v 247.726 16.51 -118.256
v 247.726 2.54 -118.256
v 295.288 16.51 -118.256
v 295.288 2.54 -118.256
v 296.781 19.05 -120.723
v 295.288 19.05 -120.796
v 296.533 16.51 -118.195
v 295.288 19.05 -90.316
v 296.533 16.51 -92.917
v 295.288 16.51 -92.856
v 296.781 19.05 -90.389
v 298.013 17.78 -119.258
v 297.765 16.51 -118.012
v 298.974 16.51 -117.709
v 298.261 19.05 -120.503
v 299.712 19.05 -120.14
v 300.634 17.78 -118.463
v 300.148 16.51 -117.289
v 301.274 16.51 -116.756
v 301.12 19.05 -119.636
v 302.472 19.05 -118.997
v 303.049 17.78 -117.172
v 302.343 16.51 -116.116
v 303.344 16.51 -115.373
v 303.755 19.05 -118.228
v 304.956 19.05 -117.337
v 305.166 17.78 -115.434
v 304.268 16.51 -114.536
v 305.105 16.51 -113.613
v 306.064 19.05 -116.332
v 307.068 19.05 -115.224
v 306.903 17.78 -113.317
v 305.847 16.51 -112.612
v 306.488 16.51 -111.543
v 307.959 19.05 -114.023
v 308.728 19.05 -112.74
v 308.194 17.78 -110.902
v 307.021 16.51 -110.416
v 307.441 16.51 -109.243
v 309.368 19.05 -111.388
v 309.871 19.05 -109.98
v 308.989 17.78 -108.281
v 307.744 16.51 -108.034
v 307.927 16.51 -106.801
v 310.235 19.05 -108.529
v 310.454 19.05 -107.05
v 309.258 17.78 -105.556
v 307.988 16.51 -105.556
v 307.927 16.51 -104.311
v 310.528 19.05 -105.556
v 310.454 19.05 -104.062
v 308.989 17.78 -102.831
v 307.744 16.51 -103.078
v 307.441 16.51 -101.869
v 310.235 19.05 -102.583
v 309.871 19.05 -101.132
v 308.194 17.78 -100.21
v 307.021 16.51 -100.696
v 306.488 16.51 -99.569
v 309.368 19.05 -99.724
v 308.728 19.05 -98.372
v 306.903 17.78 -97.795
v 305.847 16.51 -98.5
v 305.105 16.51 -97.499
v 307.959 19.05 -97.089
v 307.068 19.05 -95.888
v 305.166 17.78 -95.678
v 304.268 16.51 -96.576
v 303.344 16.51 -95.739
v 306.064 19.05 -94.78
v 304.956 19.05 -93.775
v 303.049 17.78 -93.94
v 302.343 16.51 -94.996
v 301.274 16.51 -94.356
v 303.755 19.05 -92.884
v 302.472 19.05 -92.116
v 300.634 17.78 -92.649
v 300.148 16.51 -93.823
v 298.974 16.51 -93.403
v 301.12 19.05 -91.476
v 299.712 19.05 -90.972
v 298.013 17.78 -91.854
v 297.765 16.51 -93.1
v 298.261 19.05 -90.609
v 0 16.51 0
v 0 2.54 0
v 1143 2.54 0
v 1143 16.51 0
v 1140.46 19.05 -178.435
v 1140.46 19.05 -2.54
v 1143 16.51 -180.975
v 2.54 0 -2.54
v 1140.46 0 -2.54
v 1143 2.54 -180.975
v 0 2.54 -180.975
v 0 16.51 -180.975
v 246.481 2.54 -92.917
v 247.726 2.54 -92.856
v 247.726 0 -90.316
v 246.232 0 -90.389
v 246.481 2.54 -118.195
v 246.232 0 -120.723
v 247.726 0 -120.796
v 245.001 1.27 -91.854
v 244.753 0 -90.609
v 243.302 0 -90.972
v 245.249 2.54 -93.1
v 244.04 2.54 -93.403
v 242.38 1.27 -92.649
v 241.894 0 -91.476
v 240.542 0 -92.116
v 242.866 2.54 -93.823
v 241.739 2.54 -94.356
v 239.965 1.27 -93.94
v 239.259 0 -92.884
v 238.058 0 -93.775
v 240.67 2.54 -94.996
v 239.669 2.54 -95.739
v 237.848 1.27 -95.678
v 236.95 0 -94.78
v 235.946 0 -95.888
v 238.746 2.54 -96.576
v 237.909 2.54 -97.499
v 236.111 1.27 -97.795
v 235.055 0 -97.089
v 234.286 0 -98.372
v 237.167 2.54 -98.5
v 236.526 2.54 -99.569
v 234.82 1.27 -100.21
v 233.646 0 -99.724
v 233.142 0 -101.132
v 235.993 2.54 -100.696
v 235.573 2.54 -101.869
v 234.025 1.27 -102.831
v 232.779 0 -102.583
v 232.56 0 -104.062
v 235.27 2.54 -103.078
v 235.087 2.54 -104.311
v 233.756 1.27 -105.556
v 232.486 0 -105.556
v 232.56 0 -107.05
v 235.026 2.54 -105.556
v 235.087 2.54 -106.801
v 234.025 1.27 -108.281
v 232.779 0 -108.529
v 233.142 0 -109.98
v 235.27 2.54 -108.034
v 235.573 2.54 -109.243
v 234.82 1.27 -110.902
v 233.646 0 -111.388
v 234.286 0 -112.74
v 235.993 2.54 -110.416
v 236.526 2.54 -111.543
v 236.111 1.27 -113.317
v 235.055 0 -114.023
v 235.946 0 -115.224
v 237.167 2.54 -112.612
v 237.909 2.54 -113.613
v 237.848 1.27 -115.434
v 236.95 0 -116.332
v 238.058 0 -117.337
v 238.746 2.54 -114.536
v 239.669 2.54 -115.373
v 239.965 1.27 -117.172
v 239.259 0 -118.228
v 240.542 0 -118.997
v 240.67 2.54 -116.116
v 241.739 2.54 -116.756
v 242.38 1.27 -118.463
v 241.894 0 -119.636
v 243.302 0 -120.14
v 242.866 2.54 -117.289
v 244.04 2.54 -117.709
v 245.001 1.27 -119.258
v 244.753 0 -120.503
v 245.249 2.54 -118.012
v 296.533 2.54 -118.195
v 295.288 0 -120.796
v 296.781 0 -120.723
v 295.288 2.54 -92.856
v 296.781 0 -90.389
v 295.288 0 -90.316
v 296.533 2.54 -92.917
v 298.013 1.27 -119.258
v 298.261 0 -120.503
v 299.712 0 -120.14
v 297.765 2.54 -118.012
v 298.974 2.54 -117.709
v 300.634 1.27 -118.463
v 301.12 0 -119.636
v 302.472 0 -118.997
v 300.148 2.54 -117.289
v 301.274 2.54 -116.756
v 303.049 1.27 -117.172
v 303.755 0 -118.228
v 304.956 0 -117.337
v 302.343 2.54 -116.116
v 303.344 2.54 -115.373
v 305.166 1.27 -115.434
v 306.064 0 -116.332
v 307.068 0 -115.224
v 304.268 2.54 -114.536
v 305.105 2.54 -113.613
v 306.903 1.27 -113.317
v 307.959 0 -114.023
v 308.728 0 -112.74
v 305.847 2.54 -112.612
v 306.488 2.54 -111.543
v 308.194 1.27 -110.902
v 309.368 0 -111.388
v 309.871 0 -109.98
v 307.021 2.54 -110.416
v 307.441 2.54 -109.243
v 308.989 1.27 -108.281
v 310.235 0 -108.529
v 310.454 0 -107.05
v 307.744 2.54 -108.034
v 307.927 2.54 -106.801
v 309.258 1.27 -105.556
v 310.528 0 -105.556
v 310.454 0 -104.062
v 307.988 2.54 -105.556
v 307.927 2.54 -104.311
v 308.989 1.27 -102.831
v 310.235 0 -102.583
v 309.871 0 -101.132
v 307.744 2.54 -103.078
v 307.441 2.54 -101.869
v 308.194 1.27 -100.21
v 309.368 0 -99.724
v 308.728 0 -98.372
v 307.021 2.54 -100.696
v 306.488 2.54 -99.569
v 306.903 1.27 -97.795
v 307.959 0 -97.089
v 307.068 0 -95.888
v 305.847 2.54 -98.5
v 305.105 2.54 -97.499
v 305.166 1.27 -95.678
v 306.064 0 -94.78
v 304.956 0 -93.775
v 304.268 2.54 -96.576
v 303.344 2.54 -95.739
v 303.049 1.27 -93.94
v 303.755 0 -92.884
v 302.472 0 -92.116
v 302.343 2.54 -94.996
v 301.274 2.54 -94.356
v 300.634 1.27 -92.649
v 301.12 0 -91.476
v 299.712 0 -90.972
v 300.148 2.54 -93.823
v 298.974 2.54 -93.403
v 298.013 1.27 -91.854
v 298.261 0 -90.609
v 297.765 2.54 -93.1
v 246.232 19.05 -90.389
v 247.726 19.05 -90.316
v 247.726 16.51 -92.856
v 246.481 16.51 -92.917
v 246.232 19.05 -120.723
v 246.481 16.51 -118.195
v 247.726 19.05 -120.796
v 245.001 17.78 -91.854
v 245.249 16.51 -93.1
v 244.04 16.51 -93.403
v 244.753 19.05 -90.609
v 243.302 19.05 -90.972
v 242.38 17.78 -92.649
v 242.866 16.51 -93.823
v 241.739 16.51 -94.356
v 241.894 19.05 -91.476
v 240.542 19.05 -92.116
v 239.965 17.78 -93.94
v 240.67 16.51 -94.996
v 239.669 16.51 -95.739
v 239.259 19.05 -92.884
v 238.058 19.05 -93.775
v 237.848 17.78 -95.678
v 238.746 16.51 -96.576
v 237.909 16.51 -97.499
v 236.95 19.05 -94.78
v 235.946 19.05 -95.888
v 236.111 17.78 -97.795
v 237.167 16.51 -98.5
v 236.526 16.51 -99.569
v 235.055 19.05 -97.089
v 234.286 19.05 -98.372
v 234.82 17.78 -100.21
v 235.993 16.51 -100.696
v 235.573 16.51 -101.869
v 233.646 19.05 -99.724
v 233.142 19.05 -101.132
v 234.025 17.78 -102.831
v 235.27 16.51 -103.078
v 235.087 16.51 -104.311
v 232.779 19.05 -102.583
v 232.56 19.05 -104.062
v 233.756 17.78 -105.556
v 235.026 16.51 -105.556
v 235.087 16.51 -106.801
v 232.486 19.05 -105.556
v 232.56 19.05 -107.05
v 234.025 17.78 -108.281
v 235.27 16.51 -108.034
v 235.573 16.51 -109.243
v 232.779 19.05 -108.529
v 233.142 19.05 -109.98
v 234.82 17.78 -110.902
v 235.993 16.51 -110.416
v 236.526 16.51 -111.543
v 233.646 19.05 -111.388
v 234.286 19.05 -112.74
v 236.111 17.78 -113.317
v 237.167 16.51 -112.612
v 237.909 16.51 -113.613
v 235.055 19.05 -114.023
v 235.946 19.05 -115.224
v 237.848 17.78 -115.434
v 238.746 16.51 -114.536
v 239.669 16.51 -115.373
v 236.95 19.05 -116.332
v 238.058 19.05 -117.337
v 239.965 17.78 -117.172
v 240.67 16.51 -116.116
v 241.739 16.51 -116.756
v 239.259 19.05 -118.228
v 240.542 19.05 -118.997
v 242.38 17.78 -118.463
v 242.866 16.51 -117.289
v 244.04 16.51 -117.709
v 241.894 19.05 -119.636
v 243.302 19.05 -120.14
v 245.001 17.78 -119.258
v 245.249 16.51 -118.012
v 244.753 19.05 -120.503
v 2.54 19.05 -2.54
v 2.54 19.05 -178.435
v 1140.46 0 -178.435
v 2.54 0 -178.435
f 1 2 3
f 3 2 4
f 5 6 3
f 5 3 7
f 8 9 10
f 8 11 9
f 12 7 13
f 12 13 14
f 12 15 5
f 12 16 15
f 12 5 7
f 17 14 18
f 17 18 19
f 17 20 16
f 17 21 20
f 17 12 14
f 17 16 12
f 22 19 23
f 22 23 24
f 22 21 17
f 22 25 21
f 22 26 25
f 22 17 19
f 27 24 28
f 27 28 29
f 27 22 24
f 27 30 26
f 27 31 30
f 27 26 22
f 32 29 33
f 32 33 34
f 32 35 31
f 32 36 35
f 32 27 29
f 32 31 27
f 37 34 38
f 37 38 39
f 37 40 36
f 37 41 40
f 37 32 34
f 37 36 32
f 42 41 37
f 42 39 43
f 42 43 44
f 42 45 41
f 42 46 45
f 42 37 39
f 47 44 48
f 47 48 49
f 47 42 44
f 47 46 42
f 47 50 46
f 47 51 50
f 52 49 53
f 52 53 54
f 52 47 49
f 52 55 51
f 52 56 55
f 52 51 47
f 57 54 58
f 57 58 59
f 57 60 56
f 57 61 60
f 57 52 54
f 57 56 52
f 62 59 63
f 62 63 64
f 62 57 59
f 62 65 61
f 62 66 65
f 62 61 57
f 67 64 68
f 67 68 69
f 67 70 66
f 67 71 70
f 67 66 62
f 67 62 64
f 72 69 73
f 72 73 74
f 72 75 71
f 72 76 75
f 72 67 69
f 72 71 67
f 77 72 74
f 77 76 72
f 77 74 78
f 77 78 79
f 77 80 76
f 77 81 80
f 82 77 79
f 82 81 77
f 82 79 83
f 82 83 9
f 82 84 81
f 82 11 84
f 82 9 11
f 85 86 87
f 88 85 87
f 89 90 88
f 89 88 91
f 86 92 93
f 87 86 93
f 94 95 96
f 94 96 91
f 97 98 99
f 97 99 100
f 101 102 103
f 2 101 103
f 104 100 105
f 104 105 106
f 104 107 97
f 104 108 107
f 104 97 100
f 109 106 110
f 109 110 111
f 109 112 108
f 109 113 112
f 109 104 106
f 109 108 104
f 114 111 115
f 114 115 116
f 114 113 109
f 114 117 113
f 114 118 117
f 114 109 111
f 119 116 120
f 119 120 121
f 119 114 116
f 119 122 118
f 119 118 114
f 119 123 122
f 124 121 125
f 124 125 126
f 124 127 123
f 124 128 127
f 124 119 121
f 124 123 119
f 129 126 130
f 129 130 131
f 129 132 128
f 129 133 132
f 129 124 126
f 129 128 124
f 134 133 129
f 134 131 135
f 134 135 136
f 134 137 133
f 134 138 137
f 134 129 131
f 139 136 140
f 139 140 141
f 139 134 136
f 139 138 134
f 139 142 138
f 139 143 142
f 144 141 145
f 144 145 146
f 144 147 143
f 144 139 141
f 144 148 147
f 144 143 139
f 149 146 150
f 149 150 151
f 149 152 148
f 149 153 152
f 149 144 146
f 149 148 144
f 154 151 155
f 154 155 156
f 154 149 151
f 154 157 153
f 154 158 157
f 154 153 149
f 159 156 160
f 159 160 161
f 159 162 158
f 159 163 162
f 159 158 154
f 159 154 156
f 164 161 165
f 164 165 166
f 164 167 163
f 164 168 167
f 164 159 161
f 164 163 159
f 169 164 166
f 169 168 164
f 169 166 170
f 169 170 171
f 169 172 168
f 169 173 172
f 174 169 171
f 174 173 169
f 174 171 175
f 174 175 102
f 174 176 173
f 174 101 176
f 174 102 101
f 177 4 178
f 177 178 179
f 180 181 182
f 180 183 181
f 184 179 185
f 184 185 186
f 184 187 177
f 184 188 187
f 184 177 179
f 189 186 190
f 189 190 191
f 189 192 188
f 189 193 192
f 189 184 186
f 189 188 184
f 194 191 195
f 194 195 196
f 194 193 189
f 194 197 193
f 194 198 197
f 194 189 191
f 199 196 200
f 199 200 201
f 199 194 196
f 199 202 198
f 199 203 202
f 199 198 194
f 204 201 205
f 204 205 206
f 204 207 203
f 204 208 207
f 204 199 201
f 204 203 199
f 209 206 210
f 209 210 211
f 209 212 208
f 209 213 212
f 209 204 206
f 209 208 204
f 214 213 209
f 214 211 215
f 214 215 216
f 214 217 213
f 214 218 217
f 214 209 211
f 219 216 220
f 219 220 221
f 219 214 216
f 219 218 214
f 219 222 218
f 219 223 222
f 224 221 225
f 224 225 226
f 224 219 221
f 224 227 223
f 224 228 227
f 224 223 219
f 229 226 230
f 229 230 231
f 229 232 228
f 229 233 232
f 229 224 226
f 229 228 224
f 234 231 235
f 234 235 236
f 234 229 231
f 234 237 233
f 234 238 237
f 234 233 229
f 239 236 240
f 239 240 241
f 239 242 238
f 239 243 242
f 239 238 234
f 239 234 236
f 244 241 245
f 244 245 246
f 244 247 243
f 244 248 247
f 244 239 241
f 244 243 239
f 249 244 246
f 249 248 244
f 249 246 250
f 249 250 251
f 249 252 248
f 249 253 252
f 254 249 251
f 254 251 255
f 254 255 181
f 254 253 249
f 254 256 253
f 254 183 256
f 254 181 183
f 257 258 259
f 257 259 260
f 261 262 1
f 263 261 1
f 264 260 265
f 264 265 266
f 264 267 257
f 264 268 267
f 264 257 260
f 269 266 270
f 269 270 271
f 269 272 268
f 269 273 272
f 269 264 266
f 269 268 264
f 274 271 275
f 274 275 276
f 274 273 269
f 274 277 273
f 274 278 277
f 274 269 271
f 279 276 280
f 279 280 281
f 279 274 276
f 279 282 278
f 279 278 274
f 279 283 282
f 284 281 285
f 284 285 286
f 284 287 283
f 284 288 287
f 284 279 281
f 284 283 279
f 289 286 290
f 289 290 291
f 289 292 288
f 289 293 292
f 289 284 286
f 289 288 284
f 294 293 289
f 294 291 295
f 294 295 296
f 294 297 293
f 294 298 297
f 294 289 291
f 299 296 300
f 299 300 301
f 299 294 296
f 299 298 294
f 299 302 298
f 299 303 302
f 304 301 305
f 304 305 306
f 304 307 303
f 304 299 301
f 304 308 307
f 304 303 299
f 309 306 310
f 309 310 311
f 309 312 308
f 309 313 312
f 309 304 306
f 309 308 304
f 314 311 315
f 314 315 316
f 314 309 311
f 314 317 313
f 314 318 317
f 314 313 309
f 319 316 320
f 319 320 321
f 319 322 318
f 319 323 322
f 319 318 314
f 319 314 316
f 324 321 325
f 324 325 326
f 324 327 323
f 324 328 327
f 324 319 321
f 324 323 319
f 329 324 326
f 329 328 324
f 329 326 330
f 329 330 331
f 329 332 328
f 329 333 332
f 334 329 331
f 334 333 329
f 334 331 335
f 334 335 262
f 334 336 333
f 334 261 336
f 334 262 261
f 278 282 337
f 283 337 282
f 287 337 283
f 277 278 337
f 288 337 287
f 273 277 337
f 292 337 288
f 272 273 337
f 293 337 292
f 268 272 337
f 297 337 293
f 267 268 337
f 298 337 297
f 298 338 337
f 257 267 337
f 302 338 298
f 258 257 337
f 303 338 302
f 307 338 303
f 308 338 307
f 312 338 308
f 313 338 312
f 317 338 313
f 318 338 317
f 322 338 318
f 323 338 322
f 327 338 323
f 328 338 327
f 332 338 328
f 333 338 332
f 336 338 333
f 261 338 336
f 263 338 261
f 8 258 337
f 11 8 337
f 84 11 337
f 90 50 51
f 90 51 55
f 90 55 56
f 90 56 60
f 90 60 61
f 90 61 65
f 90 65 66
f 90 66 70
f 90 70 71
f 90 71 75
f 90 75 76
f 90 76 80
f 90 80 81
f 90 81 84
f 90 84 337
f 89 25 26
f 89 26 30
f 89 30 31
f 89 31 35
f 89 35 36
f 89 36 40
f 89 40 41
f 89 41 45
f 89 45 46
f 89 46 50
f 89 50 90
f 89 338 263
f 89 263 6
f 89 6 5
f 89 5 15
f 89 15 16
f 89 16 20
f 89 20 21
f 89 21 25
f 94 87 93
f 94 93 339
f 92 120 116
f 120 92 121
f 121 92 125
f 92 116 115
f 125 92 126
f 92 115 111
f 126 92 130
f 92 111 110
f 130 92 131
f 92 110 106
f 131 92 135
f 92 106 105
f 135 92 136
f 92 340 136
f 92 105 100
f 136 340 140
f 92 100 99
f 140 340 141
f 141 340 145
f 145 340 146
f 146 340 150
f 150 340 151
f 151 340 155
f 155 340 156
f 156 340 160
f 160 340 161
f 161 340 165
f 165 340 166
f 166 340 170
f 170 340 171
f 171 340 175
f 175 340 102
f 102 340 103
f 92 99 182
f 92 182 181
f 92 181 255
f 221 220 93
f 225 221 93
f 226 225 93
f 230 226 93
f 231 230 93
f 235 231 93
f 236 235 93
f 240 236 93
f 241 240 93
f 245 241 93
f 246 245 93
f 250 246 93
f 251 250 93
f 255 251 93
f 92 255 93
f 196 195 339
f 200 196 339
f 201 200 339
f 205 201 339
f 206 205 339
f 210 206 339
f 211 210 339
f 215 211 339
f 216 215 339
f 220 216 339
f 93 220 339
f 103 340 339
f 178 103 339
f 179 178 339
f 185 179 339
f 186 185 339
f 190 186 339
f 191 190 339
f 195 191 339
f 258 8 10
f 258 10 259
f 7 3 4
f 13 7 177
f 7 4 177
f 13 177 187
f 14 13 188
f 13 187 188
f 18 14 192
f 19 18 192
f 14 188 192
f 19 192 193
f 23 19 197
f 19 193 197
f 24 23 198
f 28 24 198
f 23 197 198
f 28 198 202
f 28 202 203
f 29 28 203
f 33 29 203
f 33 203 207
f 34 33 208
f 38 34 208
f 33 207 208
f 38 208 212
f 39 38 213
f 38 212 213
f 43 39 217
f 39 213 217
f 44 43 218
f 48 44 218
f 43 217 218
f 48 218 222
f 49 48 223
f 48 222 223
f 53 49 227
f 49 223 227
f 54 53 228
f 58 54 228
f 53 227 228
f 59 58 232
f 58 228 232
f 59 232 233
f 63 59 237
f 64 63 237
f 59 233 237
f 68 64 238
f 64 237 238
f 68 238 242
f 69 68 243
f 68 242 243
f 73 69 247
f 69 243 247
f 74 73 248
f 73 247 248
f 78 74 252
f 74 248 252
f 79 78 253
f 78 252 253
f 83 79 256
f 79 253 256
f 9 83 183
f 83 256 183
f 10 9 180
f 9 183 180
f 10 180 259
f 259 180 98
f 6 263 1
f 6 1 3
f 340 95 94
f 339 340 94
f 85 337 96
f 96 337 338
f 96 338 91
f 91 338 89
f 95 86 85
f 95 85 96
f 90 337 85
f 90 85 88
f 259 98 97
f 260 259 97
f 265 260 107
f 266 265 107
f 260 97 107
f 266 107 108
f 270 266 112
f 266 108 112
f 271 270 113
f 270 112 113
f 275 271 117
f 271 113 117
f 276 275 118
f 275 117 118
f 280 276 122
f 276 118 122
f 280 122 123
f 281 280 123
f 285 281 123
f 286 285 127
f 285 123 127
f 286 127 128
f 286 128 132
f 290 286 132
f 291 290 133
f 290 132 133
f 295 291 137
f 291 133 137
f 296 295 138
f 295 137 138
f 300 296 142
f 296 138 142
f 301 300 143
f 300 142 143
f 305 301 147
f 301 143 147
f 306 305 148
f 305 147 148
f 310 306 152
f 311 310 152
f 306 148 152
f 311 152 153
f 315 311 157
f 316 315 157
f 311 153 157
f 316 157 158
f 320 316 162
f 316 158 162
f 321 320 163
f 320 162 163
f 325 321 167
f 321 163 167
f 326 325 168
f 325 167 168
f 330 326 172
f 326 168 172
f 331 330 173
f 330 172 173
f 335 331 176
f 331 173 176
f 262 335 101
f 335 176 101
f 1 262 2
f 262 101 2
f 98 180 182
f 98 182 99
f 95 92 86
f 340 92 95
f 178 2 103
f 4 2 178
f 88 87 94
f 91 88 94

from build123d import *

# Parameters (mm, degrees)
SKETCH1_W           = 1143
SKETCH1_H           = 180.975
BOSS_EXTRUDE1_DEPTH = 19.05
CHAMFER1_SIZE       = 2.54
CHAMFER2_SIZE       = 2.54


with BuildPart() as part:
    # Sketch1 → Boss-Extrude1 (new body)
    with BuildSketch(Plane(origin=(0, 0, 0), x_dir=(1, 0, 0), z_dir=(0, 1, 0))):
        with Locations((571.5, 90.4875)):
            Rectangle(SKETCH1_W, SKETCH1_H)
        with BuildLine():
            Line((247.7262, 118.25605), (295.2877, 118.25605))
            ThreePointArc((295.2877, 118.25605), (307.9877, 105.55605), (295.2877, 92.85605))
            Line((295.2877, 92.85605), (247.7262, 92.85605))
            ThreePointArc((247.7262, 92.85605), (235.0262, 105.55605), (247.7262, 118.25605))
        make_face(mode=Mode.SUBTRACT)
    extrude(amount=BOSS_EXTRUDE1_DEPTH)

    # Chamfer1
    chamfer1_edges = [part.edges().sort_by_distance(p)[0] for p in [
        (1143, 19.05, -90.4875),
        (307.9877, 19.05, -105.55605),
        (571.5, 19.05, -180.975),
        (271.50695, 19.05, -118.25605),
        (235.0262, 19.05, -105.55605),
        (271.50695, 19.05, -92.85605),
        (0, 19.05, -90.4875),
        (571.5, 19.05, 0),
    ]]
    chamfer(chamfer1_edges, length=CHAMFER1_SIZE)

    # Chamfer2
    chamfer2_edges = [part.edges().sort_by_distance(p)[0] for p in [
        (307.9877, 0, -105.55605),
        (271.50695, 0, -118.25605),
        (235.0262, 0, -105.55605),
        (271.50695, 0, -92.85605),
        (571.5, 0, -180.975),
        (1143, 0, -90.4875),
        (571.5, 0, 0),
        (0, 0, -90.4875),
    ]]
    chamfer(chamfer2_edges, length=CHAMFER2_SIZE)


solid = part.part
